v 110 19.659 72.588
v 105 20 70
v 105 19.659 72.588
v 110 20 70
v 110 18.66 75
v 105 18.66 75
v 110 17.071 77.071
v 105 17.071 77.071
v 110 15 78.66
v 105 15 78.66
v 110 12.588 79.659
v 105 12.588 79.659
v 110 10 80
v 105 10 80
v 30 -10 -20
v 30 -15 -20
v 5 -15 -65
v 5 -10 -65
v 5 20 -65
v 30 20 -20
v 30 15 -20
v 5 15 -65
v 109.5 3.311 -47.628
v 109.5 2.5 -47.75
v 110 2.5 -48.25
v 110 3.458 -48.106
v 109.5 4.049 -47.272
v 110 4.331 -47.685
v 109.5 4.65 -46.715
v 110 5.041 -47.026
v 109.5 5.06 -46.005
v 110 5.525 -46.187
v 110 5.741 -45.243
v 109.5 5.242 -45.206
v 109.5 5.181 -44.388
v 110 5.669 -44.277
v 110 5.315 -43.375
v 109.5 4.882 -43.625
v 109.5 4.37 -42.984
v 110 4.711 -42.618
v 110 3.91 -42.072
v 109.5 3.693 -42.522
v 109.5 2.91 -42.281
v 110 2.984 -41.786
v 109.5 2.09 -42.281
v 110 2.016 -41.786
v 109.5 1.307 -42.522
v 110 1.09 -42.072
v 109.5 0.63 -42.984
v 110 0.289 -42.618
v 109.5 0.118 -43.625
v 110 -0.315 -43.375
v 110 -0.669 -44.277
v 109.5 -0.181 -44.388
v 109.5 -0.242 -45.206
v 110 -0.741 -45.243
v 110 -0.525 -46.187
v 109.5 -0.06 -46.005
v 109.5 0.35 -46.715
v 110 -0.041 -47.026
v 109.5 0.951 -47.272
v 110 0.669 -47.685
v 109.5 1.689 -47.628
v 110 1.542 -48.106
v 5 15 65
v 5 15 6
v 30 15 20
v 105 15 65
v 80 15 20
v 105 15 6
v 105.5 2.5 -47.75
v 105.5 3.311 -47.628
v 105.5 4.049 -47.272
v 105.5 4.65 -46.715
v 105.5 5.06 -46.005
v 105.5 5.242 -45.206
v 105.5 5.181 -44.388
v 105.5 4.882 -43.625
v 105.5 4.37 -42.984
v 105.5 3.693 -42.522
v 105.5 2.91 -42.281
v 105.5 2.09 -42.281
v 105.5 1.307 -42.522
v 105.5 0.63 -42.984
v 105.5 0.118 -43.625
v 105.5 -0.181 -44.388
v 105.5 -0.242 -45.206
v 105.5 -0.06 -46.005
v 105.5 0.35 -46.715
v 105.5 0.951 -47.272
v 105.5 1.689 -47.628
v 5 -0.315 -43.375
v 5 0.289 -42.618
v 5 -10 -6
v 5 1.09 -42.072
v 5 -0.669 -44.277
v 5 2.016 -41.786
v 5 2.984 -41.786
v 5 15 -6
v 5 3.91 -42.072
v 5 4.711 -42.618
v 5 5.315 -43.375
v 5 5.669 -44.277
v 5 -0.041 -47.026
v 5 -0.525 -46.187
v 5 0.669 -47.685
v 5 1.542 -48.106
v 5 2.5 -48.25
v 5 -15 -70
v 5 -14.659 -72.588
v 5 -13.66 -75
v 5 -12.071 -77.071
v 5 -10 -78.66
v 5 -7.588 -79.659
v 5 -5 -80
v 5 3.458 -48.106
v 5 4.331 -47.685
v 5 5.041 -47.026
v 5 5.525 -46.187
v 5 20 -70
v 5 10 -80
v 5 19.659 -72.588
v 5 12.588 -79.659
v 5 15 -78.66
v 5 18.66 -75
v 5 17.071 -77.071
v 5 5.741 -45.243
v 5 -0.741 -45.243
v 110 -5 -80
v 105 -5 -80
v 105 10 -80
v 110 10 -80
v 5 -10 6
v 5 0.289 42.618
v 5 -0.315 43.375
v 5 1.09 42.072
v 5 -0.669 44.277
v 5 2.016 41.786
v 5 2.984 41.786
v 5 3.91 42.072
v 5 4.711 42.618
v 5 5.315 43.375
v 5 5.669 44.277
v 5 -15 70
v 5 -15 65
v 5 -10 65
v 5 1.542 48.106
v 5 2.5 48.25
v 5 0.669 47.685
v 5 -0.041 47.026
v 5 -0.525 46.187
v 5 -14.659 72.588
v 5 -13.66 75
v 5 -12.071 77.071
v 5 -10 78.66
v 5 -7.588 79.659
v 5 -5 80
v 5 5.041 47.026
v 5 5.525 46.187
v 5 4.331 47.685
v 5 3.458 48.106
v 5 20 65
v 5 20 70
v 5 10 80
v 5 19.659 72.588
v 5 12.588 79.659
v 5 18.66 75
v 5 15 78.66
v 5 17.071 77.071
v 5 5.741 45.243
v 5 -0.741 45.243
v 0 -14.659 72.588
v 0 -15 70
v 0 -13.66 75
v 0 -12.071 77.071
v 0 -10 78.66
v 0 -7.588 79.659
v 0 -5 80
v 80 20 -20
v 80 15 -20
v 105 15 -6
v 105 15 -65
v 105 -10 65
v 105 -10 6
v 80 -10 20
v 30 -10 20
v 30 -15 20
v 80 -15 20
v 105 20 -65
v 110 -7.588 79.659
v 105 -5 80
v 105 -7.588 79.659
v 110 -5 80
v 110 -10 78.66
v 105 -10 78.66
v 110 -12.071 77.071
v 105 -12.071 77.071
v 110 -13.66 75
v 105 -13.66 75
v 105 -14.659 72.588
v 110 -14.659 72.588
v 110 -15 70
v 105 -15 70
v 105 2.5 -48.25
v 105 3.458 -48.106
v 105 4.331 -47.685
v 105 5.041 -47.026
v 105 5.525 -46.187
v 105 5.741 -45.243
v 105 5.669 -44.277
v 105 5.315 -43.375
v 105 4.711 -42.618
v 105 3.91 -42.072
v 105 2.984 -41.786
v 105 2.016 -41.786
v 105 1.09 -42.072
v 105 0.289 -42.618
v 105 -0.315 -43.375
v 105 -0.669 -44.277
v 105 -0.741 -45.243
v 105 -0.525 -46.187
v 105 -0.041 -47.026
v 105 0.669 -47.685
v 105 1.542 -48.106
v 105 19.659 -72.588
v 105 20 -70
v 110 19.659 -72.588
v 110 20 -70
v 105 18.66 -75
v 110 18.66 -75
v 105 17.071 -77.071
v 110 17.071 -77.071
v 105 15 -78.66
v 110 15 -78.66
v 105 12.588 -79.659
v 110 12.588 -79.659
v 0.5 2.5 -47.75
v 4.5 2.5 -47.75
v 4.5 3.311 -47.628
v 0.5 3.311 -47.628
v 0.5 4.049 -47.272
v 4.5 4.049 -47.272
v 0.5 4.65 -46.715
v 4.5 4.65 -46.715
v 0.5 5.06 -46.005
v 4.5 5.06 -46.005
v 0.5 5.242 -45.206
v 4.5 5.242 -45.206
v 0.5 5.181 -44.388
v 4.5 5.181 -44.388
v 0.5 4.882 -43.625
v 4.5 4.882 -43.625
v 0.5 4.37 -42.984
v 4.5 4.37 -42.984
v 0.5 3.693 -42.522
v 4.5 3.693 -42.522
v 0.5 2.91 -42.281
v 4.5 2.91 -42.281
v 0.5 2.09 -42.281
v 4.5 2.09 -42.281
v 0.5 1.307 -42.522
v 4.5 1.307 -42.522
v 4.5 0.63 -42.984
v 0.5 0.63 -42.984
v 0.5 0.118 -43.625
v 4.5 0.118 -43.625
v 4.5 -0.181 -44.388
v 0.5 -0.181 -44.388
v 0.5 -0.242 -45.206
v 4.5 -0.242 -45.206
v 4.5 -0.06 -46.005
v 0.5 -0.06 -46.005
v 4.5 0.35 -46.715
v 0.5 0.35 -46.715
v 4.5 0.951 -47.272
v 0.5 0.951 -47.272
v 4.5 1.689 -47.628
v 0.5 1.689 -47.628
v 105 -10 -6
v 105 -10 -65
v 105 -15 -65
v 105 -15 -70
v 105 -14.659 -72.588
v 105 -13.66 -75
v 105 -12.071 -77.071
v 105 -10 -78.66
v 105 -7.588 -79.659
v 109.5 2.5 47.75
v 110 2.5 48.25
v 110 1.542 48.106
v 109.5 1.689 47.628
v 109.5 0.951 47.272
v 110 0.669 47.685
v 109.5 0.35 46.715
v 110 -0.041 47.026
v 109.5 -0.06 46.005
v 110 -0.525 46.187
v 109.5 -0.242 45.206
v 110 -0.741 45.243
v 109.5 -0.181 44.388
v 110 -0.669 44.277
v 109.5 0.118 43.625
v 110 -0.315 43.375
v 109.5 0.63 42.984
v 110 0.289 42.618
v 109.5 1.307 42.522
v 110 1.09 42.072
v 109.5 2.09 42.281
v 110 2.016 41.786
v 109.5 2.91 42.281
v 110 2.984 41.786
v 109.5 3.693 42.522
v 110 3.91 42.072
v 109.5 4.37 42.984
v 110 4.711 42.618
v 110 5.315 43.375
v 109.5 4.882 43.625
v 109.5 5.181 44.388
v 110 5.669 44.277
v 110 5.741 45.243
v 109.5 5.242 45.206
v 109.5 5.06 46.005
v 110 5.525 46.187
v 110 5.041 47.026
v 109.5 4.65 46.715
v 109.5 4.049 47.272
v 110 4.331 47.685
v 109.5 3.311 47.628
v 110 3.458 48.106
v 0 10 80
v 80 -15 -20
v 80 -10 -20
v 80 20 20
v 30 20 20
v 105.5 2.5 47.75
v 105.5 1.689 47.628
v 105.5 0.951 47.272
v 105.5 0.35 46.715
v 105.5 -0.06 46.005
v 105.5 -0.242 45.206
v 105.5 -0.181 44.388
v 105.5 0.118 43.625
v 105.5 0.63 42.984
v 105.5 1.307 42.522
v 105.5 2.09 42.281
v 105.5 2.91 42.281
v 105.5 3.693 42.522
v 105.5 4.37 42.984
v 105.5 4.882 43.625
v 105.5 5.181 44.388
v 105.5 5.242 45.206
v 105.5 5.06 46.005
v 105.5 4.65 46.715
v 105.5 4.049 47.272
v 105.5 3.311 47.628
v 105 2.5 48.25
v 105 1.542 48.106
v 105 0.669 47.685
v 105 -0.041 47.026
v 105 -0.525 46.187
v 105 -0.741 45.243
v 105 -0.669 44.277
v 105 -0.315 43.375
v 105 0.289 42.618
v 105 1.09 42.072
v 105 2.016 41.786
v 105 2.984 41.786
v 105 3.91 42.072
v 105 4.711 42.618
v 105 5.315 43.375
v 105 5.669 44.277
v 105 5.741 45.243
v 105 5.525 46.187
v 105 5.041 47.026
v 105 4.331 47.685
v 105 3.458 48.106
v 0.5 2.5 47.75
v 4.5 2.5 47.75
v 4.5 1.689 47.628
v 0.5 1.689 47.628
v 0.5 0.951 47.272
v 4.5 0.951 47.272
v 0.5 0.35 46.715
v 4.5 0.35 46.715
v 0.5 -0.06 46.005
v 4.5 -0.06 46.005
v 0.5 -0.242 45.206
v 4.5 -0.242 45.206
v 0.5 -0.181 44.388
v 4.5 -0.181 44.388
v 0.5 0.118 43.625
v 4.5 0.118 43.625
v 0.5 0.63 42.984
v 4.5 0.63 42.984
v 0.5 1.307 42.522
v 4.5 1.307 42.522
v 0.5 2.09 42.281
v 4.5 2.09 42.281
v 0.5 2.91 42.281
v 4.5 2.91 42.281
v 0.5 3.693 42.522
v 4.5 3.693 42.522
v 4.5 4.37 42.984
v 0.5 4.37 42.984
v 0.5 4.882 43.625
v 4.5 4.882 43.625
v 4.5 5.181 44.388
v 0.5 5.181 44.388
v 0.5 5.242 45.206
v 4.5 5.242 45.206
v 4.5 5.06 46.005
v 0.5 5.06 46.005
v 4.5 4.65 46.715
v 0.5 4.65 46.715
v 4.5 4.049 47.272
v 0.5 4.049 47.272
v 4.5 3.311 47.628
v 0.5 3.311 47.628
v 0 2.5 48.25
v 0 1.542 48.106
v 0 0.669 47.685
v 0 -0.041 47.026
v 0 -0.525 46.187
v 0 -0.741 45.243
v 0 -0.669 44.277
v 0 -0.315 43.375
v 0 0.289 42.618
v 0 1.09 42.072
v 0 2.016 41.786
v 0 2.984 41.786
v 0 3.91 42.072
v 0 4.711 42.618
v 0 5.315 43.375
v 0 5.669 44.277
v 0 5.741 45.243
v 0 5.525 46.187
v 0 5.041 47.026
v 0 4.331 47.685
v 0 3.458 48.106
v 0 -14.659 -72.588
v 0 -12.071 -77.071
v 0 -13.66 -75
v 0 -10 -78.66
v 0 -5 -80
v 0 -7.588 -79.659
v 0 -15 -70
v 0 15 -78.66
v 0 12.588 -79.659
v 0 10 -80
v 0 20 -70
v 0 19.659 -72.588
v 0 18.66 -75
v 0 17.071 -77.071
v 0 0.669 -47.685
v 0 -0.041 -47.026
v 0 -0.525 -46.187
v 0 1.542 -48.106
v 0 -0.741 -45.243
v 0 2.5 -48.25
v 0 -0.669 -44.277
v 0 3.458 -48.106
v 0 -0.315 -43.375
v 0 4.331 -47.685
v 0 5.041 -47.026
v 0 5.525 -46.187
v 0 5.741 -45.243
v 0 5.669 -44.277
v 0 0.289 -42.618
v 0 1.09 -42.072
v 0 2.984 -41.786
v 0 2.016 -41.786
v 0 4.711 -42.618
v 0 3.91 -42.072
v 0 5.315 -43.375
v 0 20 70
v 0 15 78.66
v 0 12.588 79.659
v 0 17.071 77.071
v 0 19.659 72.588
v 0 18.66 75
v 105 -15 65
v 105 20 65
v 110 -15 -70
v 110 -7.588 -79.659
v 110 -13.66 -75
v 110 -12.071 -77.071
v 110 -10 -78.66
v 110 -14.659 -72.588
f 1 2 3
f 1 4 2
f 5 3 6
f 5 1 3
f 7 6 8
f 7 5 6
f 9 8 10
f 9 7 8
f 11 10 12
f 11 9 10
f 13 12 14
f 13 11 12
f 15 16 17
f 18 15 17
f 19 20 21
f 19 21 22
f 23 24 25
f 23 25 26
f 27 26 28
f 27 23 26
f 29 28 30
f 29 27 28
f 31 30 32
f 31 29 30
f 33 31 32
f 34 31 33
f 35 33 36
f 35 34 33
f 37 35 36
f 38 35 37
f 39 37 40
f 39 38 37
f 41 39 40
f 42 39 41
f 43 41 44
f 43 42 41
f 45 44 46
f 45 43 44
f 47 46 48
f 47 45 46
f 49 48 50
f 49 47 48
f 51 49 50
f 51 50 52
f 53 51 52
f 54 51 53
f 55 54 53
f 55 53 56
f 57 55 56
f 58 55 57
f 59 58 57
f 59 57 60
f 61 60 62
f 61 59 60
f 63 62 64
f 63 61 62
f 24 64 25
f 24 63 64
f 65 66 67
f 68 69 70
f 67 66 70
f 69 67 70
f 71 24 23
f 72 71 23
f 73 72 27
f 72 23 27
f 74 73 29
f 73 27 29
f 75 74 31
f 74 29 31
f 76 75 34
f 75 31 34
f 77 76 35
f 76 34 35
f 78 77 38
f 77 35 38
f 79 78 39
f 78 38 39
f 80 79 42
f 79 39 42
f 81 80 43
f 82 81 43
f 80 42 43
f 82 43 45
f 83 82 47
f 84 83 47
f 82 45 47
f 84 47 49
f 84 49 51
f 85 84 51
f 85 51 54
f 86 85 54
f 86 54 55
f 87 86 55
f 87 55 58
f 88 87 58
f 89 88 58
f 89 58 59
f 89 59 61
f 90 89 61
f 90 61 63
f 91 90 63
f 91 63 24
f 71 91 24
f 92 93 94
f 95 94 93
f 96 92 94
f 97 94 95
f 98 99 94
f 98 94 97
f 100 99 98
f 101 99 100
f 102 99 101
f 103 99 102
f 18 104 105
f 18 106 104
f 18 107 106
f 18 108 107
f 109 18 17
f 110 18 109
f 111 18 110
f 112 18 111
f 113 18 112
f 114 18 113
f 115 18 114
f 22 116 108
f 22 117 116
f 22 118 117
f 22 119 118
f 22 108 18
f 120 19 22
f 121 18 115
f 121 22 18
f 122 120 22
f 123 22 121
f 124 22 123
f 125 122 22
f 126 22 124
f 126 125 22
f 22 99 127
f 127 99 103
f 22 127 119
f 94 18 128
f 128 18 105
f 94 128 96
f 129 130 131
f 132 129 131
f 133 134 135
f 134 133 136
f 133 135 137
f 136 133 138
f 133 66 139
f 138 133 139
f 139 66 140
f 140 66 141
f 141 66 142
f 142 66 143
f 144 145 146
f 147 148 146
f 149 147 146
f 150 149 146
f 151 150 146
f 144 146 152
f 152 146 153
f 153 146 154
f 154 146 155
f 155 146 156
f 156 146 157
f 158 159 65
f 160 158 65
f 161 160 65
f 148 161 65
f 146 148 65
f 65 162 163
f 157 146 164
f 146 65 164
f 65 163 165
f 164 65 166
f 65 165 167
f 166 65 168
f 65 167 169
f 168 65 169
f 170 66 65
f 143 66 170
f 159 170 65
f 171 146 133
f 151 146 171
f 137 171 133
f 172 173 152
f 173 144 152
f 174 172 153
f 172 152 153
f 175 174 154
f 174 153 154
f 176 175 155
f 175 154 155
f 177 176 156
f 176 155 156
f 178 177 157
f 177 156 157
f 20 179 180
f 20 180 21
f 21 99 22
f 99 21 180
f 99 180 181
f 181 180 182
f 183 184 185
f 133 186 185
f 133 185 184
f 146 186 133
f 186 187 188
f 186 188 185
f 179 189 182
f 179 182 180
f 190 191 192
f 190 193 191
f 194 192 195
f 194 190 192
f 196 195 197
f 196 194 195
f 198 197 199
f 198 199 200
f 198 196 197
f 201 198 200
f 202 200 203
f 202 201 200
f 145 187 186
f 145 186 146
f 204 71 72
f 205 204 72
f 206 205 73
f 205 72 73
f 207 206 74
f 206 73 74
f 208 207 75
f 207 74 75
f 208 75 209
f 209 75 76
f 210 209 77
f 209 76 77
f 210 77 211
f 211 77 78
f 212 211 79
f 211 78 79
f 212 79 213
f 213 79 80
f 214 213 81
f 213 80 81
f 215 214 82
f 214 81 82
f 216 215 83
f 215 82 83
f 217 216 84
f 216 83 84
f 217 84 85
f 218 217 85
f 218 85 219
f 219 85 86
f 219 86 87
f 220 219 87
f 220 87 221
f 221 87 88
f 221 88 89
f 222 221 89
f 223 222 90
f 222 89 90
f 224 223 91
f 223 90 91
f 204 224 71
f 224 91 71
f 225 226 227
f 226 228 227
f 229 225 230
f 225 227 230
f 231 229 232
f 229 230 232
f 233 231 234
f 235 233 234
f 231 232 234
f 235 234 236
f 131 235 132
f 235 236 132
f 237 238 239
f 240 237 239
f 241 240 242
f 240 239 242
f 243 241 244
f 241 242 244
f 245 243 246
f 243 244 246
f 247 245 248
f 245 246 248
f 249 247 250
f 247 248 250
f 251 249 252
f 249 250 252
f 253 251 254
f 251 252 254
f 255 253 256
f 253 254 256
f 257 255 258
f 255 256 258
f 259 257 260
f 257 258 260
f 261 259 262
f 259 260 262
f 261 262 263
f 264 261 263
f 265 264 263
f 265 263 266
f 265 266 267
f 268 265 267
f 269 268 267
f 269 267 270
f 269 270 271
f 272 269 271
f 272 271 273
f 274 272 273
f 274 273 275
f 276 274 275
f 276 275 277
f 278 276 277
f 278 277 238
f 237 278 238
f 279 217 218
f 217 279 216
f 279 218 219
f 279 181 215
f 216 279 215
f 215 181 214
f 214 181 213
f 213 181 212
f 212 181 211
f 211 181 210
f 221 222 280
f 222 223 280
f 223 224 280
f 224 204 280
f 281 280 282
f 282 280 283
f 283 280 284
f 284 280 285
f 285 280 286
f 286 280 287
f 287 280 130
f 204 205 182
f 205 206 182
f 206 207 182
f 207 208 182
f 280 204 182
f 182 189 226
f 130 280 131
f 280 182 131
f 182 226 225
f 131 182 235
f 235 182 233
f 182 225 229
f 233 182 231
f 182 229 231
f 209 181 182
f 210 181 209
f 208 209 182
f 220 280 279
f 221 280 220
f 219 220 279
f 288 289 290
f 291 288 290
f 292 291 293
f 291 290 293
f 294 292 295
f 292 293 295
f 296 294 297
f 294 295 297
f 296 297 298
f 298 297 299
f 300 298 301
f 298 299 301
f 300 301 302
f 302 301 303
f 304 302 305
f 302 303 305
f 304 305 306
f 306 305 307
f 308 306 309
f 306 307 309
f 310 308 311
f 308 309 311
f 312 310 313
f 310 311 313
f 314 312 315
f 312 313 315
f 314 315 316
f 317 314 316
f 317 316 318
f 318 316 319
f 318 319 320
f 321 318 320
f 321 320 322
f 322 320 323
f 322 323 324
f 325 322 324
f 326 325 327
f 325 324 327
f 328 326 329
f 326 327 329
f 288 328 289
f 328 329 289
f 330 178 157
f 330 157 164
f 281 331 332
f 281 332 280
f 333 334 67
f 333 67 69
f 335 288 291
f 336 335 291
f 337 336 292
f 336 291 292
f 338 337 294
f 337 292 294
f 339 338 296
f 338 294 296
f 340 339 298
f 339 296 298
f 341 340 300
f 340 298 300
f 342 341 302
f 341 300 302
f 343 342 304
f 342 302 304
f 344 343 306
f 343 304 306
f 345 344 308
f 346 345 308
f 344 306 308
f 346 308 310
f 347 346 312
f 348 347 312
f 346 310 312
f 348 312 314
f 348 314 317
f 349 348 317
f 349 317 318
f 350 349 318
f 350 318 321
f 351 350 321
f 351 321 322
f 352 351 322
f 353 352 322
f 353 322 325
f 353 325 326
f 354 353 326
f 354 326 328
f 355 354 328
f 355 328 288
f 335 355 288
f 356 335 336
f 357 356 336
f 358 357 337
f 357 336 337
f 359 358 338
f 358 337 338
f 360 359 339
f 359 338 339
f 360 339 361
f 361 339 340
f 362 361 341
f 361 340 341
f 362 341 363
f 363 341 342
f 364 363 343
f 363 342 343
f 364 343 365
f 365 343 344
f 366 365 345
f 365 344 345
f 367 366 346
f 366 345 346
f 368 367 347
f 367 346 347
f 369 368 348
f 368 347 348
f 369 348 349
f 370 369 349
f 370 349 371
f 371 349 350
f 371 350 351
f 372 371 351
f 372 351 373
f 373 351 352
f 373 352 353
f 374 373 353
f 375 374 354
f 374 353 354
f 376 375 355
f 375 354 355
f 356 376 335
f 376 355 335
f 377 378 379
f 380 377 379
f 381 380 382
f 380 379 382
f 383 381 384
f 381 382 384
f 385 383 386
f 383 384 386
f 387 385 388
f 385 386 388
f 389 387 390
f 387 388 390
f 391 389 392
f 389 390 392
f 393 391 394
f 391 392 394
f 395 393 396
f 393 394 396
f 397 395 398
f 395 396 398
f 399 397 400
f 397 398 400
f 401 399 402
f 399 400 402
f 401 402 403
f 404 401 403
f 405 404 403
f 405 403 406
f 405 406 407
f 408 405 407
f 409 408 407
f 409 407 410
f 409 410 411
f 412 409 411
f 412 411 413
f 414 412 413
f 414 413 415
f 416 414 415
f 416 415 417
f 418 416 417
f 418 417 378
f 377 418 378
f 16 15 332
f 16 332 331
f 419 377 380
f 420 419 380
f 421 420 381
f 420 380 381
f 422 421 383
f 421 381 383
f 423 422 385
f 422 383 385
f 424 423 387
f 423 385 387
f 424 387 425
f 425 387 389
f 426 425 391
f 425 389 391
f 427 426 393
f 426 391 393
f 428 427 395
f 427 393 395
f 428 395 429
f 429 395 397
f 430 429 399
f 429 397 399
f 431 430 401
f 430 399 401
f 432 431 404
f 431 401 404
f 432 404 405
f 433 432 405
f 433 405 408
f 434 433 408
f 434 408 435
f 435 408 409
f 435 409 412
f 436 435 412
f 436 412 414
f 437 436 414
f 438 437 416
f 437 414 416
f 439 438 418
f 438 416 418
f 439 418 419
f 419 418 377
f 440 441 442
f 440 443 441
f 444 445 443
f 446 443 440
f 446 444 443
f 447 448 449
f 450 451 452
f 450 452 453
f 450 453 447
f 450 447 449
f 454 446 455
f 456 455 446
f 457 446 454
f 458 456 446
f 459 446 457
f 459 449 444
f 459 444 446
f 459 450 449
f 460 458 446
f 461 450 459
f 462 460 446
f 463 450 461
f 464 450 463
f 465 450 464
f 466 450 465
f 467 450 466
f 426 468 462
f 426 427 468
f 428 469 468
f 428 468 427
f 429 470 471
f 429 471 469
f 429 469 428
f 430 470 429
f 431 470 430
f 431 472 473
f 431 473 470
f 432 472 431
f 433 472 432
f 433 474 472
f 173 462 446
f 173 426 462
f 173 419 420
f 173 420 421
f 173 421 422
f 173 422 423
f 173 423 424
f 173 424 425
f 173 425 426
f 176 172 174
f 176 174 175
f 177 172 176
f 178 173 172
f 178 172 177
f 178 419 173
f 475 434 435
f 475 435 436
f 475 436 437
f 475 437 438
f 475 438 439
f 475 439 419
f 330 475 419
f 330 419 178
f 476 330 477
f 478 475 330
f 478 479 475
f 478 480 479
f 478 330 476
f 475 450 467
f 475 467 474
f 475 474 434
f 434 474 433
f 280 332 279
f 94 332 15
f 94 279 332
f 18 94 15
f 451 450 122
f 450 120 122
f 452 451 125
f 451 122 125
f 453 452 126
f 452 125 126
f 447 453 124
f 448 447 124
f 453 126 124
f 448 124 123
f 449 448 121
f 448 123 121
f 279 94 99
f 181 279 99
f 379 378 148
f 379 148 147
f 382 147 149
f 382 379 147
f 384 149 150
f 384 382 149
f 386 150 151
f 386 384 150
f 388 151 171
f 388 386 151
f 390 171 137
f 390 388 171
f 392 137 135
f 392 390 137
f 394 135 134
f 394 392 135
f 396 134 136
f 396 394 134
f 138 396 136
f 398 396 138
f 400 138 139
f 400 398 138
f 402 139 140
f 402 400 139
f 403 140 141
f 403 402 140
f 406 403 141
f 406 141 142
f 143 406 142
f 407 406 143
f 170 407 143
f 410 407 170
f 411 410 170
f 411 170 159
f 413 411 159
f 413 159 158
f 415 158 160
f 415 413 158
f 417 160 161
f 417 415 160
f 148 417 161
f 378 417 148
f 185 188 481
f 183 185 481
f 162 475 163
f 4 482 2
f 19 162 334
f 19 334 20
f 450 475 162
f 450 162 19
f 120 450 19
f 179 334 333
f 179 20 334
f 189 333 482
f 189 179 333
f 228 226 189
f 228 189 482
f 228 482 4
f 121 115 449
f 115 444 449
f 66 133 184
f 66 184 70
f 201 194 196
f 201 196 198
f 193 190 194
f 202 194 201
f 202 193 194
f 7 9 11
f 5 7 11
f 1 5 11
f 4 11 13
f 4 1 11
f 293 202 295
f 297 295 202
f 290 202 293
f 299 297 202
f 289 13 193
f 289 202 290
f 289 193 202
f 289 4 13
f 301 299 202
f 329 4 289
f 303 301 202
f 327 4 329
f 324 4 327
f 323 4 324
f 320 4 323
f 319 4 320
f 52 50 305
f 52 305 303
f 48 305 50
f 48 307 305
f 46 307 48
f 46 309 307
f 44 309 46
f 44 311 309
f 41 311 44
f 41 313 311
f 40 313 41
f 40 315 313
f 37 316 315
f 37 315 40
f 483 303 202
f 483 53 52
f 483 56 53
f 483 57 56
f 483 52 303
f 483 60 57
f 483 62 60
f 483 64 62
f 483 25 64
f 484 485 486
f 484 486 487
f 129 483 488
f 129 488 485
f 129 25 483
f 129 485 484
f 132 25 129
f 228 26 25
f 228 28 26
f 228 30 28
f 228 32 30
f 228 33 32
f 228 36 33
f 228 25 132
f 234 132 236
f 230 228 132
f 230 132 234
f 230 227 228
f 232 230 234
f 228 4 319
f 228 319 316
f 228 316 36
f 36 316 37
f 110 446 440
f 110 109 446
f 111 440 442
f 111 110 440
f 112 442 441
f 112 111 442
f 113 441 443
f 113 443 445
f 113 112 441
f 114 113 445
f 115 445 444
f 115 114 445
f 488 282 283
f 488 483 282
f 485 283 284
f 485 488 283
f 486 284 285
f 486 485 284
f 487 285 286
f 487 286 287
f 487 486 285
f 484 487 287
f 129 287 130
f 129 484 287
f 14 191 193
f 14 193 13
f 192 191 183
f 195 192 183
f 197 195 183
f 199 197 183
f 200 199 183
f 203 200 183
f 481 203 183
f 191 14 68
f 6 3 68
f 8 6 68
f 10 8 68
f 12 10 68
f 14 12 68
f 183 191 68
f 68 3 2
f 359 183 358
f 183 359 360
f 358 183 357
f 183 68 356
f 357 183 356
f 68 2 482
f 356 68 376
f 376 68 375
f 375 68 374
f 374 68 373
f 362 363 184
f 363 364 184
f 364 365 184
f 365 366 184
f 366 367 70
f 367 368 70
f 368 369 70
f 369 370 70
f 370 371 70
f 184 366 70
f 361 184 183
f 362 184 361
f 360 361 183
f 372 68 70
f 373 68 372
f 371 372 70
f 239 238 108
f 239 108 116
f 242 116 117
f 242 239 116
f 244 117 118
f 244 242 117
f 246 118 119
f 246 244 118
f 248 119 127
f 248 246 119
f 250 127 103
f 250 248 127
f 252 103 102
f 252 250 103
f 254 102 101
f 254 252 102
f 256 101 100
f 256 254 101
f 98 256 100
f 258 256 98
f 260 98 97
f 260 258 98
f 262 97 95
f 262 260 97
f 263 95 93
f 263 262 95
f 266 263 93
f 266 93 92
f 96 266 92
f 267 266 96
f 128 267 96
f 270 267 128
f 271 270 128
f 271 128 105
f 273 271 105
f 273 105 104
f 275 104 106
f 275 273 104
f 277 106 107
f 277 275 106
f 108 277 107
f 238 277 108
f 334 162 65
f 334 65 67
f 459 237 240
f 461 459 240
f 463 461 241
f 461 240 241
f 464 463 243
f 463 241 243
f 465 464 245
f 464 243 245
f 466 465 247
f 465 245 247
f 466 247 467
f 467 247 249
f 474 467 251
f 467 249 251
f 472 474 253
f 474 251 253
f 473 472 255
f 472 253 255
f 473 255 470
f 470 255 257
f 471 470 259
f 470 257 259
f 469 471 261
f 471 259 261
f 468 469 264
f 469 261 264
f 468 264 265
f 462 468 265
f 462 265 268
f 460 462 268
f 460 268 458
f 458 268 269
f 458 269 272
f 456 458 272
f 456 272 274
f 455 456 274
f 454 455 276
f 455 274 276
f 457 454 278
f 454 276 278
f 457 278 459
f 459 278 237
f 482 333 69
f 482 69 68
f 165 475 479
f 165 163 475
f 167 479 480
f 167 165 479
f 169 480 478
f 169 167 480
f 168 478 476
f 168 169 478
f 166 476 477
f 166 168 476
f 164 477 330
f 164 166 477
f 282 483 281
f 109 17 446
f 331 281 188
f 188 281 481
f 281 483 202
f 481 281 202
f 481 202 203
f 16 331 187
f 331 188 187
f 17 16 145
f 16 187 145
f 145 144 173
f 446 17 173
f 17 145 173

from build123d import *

# Parameters (mm, degrees)
SKETCH_1_W          = 160
SKETCH_1_H          = 20
EXTRUDE_1_DEPTH     = 5
EXTRUDE_3_DEPTH     = 100
SKETCH_5_W          = 12
SKETCH_5_H          = 15
EXTRUDE_4_DEPTH     = 105
SKETCH_6_W          = 74
SKETCH_6_H          = 15
EXTRUDE_5_DEPTH     = 5
SKETCH_7_W          = 160
SKETCH_7_H          = 35
EXTRUDE_6_DEPTH     = 5
EXTRUDE_7_DEPTH     = 5
SKETCH_9_R          = 2.75
CUT_EXTRUDE_1_DEPTH = 138.477270849
CHAMFER_1_SIZE      = 0.5
FILLET_1_R          = 10
EXTRUDE_8_DEPTH     = 5
FILLET_2_R          = 10


with BuildPart() as part:
    # 草图1 → 凸台-拉伸1 (new body)
    with BuildSketch(Plane(origin=(0, 0, 0), x_dir=(0, 0, -1), z_dir=(1, 0, 0))):
        with Locations((0, -5)):
            Rectangle(SKETCH_1_W, SKETCH_1_H)
    extrude(amount=EXTRUDE_1_DEPTH)

    # 草图3 → 凸台-拉伸3 (add)
    with BuildSketch(Plane(origin=(5, 0, 0), x_dir=(0, 0, -1), z_dir=(1, 0, 0))):
        Polygon((-6, 5), (6, 5), (6, -10), (20, -10), (20, -15), (-20, -15), (-20, -10), (-6, -10), align=None)
    extrude(amount=EXTRUDE_3_DEPTH)

    # 草图5 → 凸台-拉伸4 (add)
    with BuildSketch(Plane.ZY):
        with Locations((0, 12.5)):
            Rectangle(SKETCH_5_W, SKETCH_5_H)
    extrude(amount=-EXTRUDE_4_DEPTH)

    # 草图6 → 凸台-拉伸5 (add)
    with BuildSketch(Plane.ZY):
        with Locations((43, 12.5)):
            Rectangle(SKETCH_6_W, SKETCH_6_H)
        with Locations((-43, 12.5)):
            Rectangle(SKETCH_6_W, SKETCH_6_H)
    extrude(amount=-EXTRUDE_5_DEPTH)

    # 草图7 → 凸台-拉伸6 (add)
    with BuildSketch(Plane(origin=(105, 0, 0), x_dir=(0, 0, -1), z_dir=(1, 0, 0))):
        with Locations((0, 2.5)):
            Rectangle(SKETCH_7_W, SKETCH_7_H)
    extrude(amount=EXTRUDE_6_DEPTH)

    # 草图8 → 凸台-拉伸7 (add)
    with BuildSketch(Plane.XZ.offset(15)):
        Polygon((80, 20), (105, 65), (105, 20), align=None)
        Polygon((105, -20), (80, -20), (105, -65), align=None)
        Polygon((5, 20), (30, 20), (5, 65), align=None)
        Polygon((30, -20), (5, -65), (5, -20), align=None)
    extrude(amount=-EXTRUDE_7_DEPTH)

    # 草图9 → 切除-拉伸1 (cut, through all)
    with BuildSketch(Plane(origin=(110, 0, 0), x_dir=(0, 0, -1), z_dir=(1, 0, 0))):
        with Locations((45, 2.5)):
            Circle(SKETCH_9_R)
        with Locations(Location((-45, 2.5, 0), (0, 0, 180))):
            Circle(SKETCH_9_R)
    extrude(amount=-CUT_EXTRUDE_1_DEPTH, mode=Mode.SUBTRACT)

    # 倒角1
    chamfer_1_edges = [part.edges().sort_by_distance(p)[0] for p in [
        (105, 2.5, -42.25),
        (5, 2.5, -42.25),
        (0, 2.5, -42.25),
        (110, 2.5, -42.25),
        (105, 2.5, 42.25),
        (5, 2.5, 42.25),
        (0, 2.5, 42.25),
        (110, 2.5, 42.25),
    ]]
    chamfer(chamfer_1_edges, length=CHAMFER_1_SIZE)

    # 圆角1
    fillet_1_edges = [part.edges().sort_by_distance(p)[0] for p in [
        (107.5, -15, 80),
        (107.5, -15, -80),
        (2.5, -15, -80),
        (2.5, -15, 80),
    ]]
    fillet(fillet_1_edges, radius=FILLET_1_R)

    # 草图10 → 凸台-拉伸8 (add)
    with BuildSketch(Plane(origin=(0, 20, 0), x_dir=(1, 0, 0), z_dir=(0, 1, 0))):
        Polygon((5, 65), (5, 6), (105, 6), (105, 65), (80, 20), (30, 20), align=None)
        Polygon((5, -6), (5, -65), (30, -20), (80, -20), (105, -65), (105, -6), align=None)
    extrude(amount=-EXTRUDE_8_DEPTH)

    # 圆角2
    fillet_2_edges = [part.edges().sort_by_distance(p)[0] for p in [
        (2.5, 20, 80),
        (2.5, 20, -80),
        (107.5, 20, 80),
        (107.5, 20, -80),
    ]]
    fillet(fillet_2_edges, radius=FILLET_2_R)


solid = part.part
